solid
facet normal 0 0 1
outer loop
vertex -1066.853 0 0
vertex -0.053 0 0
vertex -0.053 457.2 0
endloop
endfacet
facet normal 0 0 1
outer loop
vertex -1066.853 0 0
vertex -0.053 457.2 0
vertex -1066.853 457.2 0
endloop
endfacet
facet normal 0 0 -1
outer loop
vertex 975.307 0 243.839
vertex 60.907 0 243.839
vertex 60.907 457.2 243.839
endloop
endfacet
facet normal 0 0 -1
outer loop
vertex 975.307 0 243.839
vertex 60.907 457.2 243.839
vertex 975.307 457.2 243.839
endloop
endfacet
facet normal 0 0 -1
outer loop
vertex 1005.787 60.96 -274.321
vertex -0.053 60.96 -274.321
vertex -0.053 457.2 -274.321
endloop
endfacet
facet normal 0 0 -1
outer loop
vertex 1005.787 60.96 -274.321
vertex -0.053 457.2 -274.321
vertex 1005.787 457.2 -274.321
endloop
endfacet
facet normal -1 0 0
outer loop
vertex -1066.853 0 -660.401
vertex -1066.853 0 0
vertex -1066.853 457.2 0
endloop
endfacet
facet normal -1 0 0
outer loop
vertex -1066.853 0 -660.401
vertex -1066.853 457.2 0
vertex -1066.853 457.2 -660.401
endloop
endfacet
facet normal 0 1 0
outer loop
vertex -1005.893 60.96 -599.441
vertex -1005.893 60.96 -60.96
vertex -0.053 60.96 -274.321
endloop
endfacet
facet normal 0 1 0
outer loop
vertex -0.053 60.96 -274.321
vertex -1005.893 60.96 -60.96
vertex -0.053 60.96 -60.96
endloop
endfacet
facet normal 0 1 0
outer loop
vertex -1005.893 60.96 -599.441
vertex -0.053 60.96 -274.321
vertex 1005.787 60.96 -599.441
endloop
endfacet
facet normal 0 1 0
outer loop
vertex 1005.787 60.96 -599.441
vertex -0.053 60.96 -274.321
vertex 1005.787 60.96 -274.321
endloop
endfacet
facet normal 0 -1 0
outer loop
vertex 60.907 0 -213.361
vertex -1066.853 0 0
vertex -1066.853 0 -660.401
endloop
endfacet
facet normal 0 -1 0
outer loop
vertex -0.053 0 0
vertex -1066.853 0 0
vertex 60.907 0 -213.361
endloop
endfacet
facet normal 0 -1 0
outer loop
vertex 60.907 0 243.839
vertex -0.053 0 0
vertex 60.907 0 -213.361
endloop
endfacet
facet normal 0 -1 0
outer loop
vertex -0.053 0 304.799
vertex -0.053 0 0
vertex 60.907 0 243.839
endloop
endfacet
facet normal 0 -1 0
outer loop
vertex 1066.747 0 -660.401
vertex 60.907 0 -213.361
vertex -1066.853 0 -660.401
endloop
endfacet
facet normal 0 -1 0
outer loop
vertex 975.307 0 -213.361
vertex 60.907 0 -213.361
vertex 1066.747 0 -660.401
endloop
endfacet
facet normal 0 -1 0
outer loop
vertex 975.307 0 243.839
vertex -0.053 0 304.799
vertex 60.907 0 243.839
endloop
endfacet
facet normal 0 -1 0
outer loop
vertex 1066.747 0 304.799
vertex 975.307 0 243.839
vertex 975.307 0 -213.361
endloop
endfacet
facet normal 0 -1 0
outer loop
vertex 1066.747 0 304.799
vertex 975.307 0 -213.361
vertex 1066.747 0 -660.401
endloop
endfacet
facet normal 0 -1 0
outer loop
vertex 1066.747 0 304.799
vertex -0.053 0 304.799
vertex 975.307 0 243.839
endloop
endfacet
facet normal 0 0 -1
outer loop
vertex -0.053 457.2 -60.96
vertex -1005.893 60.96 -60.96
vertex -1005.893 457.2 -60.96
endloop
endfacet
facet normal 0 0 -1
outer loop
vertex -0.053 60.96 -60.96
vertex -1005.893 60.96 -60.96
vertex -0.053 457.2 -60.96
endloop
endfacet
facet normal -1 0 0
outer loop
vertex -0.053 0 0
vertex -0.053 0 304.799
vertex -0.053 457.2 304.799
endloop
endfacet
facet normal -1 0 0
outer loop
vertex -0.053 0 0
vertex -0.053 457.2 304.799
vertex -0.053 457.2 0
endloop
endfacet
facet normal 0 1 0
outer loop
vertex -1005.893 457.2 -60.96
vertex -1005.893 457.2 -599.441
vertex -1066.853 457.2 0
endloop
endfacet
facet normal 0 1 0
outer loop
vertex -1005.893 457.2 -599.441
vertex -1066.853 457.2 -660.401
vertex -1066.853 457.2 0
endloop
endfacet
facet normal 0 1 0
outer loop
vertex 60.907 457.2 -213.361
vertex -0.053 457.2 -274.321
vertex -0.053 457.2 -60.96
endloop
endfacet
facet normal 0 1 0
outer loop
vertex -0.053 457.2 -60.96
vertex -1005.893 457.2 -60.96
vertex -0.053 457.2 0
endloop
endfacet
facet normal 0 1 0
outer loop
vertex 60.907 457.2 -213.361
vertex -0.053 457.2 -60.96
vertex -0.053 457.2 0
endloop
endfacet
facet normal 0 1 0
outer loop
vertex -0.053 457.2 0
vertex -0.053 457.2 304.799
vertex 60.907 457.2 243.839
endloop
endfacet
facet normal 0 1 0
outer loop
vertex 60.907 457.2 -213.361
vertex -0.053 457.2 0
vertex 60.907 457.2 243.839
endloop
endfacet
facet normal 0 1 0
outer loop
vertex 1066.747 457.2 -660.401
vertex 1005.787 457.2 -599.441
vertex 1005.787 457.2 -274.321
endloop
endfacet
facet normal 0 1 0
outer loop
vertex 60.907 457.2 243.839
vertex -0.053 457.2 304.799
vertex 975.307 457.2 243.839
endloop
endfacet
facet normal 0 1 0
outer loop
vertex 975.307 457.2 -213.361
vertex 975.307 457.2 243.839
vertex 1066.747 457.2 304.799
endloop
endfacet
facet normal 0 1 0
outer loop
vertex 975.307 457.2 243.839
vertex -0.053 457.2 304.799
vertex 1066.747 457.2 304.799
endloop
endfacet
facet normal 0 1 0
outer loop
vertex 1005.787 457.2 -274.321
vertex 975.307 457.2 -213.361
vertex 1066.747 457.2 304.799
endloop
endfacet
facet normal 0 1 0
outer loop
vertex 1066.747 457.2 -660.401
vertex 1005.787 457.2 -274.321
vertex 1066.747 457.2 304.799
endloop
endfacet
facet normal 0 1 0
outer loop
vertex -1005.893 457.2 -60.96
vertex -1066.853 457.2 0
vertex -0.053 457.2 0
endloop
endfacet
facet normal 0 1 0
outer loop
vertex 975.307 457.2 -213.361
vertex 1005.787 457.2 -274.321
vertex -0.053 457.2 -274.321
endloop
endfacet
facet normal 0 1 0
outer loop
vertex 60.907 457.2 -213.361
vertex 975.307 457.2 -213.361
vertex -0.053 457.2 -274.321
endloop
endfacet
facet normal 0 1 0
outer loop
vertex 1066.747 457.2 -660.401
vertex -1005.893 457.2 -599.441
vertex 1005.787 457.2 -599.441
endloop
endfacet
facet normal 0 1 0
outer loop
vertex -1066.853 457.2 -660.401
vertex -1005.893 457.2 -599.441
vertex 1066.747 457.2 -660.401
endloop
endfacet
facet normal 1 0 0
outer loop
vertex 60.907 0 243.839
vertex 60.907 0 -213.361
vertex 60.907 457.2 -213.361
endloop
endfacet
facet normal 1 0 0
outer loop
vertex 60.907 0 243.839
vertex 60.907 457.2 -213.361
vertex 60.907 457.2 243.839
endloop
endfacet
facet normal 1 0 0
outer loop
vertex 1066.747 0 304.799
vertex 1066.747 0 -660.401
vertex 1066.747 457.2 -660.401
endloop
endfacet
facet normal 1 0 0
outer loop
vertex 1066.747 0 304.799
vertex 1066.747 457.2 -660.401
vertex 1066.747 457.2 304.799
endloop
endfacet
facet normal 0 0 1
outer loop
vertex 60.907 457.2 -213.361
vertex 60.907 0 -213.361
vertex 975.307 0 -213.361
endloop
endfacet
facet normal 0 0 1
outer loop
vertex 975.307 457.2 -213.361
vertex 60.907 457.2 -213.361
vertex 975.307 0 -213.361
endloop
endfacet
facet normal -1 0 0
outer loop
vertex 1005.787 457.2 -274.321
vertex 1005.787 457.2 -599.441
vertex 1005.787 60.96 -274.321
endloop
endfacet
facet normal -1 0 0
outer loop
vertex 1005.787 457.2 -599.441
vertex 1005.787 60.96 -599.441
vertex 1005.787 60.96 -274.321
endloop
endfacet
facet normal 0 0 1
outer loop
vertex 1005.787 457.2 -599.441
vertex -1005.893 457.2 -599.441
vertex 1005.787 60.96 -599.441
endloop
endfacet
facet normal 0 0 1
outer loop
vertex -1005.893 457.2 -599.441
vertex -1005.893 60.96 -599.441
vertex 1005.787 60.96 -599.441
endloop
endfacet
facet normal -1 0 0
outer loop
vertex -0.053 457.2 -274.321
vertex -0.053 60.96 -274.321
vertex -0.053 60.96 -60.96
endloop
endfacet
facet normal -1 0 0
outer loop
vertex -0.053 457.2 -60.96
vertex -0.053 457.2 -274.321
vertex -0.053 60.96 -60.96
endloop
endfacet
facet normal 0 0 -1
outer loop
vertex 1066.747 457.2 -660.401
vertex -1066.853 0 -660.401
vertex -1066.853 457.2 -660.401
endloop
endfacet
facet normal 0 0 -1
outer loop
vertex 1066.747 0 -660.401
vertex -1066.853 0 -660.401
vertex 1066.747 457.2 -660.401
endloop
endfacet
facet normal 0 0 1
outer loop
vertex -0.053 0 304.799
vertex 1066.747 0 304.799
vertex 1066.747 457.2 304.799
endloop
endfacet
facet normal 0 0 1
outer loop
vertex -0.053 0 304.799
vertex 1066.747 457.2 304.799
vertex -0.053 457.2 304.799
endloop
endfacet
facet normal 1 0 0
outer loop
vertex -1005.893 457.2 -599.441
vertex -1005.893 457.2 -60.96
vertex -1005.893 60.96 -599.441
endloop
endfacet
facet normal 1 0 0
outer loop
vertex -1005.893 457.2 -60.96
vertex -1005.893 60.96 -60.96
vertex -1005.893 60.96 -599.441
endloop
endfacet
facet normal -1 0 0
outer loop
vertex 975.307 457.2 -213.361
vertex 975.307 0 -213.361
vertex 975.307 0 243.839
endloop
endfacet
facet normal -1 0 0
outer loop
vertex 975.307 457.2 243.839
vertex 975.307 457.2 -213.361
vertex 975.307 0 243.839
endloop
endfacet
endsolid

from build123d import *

# Parameters (mm, degrees)
F1_DEPTH = 457.2
F2_W     = 914.4
F2_H     = 457.2
F3_DEPTH = 457.2
F4_T     = -60.96


# Not quite as in the source:
# - a shell that OpenCascade refuses in one call is made with other operations: the cavity is built on its own and cut out


with BuildPart() as f1:
    # F0 (on Front) → F1 (new body)
    with BuildSketch(Plane.XZ):
        Polygon((-0.0530799283, 304.7990856), (-0.0530799283, 0), (-1066.8530799283, 0), (-1066.8530799283, -660.401016), (-0.0530799283, -660.401016), (1066.7469200717, -660.401016), (1066.7469200717, 304.7990856), align=None)
    extrude(amount=-F1_DEPTH)

    # F2 (on face) → F3 (cut, through all)
    with BuildSketch(Plane.XZ):
        with Locations((518.1069200717, 15.2390856)):
            Rectangle(F2_W, F2_H)
    extrude(amount=-F3_DEPTH, mode=Mode.SUBTRACT)

    # F4: a shell. OpenCascade refuses it in one call, so the cavity is built on its own and cut out:
    # the body offset inwards by the wall thickness, plus a prism from it out through each open face.
    f4_core = offset(f1.part, amount=F4_T, kind=Kind.INTERSECTION, mode=Mode.PRIVATE)
    f4_exits = [f4_core.faces().sort_by_distance(p)[0] for p in [
        (-124.304275, 396.24, -370.362523),
    ]]
    add(f4_core, mode=Mode.SUBTRACT)
    extrude(f4_exits, amount=-F4_T, mode=Mode.SUBTRACT)


solid = f1.part
